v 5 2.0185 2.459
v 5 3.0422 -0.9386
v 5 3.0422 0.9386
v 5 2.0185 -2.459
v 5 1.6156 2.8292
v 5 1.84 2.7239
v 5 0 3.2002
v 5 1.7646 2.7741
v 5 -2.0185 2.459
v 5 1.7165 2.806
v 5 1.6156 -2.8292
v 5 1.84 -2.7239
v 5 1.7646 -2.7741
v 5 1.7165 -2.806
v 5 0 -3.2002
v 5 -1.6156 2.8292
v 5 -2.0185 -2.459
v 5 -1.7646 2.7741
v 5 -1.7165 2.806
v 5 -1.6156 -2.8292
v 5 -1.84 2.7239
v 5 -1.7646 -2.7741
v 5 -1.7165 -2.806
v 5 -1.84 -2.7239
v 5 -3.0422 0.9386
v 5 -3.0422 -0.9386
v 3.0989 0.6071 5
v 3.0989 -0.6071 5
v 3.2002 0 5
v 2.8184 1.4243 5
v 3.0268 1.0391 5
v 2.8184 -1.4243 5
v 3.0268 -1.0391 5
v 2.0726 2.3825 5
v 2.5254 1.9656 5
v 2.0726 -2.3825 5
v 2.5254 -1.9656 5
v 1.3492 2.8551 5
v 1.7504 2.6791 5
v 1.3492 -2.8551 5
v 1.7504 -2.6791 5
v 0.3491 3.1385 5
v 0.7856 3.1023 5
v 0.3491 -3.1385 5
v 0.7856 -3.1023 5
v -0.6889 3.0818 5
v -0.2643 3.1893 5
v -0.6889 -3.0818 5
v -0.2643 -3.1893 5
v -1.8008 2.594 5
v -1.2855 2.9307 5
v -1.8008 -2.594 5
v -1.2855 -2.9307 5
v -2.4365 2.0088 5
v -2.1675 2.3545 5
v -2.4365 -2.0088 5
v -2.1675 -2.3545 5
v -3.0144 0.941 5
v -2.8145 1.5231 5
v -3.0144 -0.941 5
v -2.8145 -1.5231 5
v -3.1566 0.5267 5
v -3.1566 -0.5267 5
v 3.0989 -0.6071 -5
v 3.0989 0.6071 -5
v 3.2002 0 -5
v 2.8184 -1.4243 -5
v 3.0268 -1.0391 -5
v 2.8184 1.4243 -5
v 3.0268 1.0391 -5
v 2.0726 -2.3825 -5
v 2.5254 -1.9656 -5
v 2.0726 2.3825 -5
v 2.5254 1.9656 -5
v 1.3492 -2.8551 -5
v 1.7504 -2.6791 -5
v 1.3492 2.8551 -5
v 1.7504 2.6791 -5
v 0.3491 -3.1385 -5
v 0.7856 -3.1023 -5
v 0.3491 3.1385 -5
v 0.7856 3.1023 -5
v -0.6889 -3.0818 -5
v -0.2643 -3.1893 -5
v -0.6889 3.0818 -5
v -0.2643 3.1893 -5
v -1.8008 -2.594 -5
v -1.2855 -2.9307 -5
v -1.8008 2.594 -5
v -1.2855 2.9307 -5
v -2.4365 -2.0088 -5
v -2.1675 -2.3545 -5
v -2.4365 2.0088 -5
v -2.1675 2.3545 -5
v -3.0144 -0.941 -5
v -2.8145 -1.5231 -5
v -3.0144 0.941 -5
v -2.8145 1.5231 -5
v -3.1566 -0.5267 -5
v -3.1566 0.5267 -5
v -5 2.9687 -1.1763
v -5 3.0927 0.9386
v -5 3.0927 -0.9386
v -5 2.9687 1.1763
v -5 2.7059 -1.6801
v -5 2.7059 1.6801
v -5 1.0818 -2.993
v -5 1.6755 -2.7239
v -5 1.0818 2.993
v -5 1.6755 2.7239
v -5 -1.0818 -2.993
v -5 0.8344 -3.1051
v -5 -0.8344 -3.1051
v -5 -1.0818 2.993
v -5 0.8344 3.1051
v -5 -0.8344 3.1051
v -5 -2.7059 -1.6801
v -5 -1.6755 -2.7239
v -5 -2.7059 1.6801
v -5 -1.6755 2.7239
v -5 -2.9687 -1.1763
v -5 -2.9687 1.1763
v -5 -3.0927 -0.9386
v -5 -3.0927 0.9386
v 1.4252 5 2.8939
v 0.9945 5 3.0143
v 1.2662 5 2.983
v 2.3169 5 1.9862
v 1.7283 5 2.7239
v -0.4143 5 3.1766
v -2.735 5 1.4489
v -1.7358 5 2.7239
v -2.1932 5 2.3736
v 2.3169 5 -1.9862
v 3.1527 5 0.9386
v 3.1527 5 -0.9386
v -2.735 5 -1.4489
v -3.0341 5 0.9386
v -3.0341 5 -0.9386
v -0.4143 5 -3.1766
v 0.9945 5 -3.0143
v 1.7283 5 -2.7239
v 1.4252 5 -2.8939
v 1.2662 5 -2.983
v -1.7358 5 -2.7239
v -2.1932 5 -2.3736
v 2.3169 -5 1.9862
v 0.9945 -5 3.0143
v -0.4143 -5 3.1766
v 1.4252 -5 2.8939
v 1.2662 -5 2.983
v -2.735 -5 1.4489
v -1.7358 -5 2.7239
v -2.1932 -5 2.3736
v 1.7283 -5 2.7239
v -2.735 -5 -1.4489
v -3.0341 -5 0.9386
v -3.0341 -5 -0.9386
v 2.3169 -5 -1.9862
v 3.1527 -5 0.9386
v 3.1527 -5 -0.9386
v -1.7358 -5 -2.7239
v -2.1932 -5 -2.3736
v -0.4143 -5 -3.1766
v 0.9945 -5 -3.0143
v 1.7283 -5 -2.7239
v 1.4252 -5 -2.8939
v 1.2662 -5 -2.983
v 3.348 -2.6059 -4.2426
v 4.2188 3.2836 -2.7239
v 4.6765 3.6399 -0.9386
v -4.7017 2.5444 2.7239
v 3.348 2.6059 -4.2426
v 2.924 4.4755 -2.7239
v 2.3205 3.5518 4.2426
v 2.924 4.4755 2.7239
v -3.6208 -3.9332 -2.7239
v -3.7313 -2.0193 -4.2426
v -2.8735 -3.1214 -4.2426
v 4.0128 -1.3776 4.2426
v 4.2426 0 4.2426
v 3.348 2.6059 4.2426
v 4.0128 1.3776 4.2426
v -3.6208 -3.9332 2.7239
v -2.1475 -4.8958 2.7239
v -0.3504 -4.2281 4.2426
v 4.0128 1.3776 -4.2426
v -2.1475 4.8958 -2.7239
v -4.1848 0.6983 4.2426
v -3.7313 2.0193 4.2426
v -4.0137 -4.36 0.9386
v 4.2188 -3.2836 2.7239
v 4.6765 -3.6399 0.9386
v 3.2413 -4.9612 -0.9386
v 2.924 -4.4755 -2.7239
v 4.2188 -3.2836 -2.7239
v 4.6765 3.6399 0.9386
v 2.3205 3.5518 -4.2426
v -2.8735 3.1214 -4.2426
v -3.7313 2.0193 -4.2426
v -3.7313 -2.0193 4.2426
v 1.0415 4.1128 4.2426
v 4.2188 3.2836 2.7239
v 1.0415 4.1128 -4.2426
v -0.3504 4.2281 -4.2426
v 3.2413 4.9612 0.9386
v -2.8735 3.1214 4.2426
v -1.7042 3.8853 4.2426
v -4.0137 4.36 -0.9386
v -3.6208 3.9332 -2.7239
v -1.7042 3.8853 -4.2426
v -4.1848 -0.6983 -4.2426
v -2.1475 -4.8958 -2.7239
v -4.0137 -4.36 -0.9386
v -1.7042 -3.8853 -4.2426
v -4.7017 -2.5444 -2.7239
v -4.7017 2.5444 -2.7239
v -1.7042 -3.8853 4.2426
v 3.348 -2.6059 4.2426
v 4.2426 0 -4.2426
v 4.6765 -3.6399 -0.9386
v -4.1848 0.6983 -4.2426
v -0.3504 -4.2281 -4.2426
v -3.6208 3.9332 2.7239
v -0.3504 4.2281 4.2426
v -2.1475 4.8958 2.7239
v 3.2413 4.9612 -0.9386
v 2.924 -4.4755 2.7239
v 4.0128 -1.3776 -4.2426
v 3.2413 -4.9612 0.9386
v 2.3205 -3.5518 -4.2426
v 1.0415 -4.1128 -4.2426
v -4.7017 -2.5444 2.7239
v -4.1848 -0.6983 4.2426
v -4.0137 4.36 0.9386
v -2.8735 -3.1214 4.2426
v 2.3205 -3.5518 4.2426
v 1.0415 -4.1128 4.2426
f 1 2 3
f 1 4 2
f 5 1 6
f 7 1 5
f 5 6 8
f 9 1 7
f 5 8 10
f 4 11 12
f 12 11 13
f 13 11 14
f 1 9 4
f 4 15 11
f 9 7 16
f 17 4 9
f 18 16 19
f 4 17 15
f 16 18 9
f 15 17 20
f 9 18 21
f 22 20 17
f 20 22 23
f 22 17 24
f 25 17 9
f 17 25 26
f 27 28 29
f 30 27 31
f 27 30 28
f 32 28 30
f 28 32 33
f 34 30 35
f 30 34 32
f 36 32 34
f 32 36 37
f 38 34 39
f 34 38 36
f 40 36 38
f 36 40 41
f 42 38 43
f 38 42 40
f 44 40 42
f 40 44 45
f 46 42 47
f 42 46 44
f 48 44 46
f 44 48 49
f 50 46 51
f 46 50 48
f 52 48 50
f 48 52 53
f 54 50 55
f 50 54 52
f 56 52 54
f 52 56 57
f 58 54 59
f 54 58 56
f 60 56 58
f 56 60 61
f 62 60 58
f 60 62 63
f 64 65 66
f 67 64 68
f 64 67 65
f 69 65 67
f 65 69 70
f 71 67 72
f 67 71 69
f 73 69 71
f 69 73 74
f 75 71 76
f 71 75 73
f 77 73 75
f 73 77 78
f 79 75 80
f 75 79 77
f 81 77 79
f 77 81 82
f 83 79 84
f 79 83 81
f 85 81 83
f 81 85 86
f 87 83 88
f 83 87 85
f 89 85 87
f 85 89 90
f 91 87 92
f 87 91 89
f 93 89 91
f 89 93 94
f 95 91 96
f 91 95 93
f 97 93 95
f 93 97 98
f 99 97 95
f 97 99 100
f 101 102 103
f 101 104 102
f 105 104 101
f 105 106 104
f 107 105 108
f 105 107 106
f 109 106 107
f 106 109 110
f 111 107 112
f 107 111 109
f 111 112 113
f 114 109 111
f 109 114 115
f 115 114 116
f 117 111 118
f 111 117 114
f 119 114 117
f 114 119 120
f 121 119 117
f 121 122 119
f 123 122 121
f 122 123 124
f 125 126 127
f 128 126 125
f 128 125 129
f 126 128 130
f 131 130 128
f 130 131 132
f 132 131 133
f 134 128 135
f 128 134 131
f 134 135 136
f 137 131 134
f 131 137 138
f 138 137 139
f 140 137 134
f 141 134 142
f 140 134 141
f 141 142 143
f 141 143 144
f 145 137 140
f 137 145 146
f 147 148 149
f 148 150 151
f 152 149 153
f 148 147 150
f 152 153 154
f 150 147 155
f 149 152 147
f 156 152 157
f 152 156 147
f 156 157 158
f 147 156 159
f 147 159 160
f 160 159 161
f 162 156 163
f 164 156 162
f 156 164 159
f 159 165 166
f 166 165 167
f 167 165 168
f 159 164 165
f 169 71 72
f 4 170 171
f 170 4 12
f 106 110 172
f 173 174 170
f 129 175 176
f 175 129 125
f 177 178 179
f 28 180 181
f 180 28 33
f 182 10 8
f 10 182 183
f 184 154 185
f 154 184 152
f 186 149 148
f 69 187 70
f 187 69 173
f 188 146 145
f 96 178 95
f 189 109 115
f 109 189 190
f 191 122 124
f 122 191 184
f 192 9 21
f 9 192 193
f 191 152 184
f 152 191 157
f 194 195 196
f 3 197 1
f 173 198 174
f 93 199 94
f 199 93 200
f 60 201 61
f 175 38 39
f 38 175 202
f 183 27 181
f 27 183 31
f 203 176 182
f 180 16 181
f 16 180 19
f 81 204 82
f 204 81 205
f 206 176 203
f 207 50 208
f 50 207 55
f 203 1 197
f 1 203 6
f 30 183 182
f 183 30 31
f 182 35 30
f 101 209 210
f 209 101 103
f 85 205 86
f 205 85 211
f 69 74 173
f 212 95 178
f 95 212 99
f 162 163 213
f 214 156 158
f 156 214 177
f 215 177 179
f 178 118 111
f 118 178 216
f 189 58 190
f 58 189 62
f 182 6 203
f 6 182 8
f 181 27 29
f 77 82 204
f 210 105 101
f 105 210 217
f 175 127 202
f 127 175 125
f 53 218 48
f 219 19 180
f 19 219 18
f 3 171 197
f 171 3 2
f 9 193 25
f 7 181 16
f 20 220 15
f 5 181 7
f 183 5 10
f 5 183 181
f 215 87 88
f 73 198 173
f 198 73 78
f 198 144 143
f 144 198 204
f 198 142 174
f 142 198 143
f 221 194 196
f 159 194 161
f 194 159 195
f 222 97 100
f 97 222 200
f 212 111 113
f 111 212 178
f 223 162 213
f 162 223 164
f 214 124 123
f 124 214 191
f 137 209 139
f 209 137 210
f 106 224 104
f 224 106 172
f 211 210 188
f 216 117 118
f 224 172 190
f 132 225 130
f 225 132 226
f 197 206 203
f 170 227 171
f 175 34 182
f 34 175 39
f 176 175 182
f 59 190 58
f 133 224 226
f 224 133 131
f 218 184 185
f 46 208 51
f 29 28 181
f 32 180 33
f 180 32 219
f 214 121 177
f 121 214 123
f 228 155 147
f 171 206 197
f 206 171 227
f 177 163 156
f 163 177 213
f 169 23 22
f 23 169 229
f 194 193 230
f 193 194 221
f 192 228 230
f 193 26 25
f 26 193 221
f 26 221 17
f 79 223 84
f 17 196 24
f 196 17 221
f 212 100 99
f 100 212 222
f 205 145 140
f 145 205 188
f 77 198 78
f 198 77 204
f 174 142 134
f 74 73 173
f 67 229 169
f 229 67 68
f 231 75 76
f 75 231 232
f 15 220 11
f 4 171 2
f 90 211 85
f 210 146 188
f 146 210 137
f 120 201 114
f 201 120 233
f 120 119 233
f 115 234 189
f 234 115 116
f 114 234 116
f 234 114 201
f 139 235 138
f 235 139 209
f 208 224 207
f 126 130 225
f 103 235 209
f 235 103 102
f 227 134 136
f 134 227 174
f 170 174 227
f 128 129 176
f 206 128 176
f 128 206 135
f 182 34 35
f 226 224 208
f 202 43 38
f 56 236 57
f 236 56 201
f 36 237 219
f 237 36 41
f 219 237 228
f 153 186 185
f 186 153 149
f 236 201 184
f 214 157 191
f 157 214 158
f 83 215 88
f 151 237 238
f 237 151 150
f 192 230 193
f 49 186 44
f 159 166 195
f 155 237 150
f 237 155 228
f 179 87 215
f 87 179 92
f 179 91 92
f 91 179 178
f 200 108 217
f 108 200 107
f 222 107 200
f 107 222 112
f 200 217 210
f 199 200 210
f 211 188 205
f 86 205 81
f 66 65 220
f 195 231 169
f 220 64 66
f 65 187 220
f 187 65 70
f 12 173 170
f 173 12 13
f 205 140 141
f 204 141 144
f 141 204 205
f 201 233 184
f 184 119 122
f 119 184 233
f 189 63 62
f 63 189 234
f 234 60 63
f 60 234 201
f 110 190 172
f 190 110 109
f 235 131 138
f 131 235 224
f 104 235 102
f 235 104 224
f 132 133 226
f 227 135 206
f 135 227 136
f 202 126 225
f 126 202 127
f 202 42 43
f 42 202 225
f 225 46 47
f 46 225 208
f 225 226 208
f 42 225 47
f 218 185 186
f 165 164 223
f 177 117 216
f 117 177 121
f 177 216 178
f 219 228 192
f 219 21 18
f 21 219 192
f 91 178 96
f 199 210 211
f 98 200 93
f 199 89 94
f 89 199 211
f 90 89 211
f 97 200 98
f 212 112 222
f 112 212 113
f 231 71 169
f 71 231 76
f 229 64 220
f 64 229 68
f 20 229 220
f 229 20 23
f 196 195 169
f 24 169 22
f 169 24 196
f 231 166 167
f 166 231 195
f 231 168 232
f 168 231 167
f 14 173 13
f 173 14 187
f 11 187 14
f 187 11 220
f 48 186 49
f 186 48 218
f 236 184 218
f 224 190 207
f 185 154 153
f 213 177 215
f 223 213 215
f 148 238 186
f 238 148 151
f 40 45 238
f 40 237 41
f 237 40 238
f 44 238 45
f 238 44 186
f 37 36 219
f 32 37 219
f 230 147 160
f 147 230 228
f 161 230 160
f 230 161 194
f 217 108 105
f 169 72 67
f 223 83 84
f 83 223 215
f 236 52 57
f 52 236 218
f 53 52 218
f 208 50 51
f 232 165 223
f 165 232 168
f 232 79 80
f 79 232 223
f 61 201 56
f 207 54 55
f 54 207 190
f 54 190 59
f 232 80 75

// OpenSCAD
/*
 * The intersection function combines two object only where they intersect each other.
 * 2D and 3D objects can be intersected but only one dimension at a time.
 */
intersection() {
    cube([10, 10, 10], center = true); // Cube slightly larger than the sphere.
    sphere(r = 6, center = true); // Sphere wrapping some of the cube.
}
